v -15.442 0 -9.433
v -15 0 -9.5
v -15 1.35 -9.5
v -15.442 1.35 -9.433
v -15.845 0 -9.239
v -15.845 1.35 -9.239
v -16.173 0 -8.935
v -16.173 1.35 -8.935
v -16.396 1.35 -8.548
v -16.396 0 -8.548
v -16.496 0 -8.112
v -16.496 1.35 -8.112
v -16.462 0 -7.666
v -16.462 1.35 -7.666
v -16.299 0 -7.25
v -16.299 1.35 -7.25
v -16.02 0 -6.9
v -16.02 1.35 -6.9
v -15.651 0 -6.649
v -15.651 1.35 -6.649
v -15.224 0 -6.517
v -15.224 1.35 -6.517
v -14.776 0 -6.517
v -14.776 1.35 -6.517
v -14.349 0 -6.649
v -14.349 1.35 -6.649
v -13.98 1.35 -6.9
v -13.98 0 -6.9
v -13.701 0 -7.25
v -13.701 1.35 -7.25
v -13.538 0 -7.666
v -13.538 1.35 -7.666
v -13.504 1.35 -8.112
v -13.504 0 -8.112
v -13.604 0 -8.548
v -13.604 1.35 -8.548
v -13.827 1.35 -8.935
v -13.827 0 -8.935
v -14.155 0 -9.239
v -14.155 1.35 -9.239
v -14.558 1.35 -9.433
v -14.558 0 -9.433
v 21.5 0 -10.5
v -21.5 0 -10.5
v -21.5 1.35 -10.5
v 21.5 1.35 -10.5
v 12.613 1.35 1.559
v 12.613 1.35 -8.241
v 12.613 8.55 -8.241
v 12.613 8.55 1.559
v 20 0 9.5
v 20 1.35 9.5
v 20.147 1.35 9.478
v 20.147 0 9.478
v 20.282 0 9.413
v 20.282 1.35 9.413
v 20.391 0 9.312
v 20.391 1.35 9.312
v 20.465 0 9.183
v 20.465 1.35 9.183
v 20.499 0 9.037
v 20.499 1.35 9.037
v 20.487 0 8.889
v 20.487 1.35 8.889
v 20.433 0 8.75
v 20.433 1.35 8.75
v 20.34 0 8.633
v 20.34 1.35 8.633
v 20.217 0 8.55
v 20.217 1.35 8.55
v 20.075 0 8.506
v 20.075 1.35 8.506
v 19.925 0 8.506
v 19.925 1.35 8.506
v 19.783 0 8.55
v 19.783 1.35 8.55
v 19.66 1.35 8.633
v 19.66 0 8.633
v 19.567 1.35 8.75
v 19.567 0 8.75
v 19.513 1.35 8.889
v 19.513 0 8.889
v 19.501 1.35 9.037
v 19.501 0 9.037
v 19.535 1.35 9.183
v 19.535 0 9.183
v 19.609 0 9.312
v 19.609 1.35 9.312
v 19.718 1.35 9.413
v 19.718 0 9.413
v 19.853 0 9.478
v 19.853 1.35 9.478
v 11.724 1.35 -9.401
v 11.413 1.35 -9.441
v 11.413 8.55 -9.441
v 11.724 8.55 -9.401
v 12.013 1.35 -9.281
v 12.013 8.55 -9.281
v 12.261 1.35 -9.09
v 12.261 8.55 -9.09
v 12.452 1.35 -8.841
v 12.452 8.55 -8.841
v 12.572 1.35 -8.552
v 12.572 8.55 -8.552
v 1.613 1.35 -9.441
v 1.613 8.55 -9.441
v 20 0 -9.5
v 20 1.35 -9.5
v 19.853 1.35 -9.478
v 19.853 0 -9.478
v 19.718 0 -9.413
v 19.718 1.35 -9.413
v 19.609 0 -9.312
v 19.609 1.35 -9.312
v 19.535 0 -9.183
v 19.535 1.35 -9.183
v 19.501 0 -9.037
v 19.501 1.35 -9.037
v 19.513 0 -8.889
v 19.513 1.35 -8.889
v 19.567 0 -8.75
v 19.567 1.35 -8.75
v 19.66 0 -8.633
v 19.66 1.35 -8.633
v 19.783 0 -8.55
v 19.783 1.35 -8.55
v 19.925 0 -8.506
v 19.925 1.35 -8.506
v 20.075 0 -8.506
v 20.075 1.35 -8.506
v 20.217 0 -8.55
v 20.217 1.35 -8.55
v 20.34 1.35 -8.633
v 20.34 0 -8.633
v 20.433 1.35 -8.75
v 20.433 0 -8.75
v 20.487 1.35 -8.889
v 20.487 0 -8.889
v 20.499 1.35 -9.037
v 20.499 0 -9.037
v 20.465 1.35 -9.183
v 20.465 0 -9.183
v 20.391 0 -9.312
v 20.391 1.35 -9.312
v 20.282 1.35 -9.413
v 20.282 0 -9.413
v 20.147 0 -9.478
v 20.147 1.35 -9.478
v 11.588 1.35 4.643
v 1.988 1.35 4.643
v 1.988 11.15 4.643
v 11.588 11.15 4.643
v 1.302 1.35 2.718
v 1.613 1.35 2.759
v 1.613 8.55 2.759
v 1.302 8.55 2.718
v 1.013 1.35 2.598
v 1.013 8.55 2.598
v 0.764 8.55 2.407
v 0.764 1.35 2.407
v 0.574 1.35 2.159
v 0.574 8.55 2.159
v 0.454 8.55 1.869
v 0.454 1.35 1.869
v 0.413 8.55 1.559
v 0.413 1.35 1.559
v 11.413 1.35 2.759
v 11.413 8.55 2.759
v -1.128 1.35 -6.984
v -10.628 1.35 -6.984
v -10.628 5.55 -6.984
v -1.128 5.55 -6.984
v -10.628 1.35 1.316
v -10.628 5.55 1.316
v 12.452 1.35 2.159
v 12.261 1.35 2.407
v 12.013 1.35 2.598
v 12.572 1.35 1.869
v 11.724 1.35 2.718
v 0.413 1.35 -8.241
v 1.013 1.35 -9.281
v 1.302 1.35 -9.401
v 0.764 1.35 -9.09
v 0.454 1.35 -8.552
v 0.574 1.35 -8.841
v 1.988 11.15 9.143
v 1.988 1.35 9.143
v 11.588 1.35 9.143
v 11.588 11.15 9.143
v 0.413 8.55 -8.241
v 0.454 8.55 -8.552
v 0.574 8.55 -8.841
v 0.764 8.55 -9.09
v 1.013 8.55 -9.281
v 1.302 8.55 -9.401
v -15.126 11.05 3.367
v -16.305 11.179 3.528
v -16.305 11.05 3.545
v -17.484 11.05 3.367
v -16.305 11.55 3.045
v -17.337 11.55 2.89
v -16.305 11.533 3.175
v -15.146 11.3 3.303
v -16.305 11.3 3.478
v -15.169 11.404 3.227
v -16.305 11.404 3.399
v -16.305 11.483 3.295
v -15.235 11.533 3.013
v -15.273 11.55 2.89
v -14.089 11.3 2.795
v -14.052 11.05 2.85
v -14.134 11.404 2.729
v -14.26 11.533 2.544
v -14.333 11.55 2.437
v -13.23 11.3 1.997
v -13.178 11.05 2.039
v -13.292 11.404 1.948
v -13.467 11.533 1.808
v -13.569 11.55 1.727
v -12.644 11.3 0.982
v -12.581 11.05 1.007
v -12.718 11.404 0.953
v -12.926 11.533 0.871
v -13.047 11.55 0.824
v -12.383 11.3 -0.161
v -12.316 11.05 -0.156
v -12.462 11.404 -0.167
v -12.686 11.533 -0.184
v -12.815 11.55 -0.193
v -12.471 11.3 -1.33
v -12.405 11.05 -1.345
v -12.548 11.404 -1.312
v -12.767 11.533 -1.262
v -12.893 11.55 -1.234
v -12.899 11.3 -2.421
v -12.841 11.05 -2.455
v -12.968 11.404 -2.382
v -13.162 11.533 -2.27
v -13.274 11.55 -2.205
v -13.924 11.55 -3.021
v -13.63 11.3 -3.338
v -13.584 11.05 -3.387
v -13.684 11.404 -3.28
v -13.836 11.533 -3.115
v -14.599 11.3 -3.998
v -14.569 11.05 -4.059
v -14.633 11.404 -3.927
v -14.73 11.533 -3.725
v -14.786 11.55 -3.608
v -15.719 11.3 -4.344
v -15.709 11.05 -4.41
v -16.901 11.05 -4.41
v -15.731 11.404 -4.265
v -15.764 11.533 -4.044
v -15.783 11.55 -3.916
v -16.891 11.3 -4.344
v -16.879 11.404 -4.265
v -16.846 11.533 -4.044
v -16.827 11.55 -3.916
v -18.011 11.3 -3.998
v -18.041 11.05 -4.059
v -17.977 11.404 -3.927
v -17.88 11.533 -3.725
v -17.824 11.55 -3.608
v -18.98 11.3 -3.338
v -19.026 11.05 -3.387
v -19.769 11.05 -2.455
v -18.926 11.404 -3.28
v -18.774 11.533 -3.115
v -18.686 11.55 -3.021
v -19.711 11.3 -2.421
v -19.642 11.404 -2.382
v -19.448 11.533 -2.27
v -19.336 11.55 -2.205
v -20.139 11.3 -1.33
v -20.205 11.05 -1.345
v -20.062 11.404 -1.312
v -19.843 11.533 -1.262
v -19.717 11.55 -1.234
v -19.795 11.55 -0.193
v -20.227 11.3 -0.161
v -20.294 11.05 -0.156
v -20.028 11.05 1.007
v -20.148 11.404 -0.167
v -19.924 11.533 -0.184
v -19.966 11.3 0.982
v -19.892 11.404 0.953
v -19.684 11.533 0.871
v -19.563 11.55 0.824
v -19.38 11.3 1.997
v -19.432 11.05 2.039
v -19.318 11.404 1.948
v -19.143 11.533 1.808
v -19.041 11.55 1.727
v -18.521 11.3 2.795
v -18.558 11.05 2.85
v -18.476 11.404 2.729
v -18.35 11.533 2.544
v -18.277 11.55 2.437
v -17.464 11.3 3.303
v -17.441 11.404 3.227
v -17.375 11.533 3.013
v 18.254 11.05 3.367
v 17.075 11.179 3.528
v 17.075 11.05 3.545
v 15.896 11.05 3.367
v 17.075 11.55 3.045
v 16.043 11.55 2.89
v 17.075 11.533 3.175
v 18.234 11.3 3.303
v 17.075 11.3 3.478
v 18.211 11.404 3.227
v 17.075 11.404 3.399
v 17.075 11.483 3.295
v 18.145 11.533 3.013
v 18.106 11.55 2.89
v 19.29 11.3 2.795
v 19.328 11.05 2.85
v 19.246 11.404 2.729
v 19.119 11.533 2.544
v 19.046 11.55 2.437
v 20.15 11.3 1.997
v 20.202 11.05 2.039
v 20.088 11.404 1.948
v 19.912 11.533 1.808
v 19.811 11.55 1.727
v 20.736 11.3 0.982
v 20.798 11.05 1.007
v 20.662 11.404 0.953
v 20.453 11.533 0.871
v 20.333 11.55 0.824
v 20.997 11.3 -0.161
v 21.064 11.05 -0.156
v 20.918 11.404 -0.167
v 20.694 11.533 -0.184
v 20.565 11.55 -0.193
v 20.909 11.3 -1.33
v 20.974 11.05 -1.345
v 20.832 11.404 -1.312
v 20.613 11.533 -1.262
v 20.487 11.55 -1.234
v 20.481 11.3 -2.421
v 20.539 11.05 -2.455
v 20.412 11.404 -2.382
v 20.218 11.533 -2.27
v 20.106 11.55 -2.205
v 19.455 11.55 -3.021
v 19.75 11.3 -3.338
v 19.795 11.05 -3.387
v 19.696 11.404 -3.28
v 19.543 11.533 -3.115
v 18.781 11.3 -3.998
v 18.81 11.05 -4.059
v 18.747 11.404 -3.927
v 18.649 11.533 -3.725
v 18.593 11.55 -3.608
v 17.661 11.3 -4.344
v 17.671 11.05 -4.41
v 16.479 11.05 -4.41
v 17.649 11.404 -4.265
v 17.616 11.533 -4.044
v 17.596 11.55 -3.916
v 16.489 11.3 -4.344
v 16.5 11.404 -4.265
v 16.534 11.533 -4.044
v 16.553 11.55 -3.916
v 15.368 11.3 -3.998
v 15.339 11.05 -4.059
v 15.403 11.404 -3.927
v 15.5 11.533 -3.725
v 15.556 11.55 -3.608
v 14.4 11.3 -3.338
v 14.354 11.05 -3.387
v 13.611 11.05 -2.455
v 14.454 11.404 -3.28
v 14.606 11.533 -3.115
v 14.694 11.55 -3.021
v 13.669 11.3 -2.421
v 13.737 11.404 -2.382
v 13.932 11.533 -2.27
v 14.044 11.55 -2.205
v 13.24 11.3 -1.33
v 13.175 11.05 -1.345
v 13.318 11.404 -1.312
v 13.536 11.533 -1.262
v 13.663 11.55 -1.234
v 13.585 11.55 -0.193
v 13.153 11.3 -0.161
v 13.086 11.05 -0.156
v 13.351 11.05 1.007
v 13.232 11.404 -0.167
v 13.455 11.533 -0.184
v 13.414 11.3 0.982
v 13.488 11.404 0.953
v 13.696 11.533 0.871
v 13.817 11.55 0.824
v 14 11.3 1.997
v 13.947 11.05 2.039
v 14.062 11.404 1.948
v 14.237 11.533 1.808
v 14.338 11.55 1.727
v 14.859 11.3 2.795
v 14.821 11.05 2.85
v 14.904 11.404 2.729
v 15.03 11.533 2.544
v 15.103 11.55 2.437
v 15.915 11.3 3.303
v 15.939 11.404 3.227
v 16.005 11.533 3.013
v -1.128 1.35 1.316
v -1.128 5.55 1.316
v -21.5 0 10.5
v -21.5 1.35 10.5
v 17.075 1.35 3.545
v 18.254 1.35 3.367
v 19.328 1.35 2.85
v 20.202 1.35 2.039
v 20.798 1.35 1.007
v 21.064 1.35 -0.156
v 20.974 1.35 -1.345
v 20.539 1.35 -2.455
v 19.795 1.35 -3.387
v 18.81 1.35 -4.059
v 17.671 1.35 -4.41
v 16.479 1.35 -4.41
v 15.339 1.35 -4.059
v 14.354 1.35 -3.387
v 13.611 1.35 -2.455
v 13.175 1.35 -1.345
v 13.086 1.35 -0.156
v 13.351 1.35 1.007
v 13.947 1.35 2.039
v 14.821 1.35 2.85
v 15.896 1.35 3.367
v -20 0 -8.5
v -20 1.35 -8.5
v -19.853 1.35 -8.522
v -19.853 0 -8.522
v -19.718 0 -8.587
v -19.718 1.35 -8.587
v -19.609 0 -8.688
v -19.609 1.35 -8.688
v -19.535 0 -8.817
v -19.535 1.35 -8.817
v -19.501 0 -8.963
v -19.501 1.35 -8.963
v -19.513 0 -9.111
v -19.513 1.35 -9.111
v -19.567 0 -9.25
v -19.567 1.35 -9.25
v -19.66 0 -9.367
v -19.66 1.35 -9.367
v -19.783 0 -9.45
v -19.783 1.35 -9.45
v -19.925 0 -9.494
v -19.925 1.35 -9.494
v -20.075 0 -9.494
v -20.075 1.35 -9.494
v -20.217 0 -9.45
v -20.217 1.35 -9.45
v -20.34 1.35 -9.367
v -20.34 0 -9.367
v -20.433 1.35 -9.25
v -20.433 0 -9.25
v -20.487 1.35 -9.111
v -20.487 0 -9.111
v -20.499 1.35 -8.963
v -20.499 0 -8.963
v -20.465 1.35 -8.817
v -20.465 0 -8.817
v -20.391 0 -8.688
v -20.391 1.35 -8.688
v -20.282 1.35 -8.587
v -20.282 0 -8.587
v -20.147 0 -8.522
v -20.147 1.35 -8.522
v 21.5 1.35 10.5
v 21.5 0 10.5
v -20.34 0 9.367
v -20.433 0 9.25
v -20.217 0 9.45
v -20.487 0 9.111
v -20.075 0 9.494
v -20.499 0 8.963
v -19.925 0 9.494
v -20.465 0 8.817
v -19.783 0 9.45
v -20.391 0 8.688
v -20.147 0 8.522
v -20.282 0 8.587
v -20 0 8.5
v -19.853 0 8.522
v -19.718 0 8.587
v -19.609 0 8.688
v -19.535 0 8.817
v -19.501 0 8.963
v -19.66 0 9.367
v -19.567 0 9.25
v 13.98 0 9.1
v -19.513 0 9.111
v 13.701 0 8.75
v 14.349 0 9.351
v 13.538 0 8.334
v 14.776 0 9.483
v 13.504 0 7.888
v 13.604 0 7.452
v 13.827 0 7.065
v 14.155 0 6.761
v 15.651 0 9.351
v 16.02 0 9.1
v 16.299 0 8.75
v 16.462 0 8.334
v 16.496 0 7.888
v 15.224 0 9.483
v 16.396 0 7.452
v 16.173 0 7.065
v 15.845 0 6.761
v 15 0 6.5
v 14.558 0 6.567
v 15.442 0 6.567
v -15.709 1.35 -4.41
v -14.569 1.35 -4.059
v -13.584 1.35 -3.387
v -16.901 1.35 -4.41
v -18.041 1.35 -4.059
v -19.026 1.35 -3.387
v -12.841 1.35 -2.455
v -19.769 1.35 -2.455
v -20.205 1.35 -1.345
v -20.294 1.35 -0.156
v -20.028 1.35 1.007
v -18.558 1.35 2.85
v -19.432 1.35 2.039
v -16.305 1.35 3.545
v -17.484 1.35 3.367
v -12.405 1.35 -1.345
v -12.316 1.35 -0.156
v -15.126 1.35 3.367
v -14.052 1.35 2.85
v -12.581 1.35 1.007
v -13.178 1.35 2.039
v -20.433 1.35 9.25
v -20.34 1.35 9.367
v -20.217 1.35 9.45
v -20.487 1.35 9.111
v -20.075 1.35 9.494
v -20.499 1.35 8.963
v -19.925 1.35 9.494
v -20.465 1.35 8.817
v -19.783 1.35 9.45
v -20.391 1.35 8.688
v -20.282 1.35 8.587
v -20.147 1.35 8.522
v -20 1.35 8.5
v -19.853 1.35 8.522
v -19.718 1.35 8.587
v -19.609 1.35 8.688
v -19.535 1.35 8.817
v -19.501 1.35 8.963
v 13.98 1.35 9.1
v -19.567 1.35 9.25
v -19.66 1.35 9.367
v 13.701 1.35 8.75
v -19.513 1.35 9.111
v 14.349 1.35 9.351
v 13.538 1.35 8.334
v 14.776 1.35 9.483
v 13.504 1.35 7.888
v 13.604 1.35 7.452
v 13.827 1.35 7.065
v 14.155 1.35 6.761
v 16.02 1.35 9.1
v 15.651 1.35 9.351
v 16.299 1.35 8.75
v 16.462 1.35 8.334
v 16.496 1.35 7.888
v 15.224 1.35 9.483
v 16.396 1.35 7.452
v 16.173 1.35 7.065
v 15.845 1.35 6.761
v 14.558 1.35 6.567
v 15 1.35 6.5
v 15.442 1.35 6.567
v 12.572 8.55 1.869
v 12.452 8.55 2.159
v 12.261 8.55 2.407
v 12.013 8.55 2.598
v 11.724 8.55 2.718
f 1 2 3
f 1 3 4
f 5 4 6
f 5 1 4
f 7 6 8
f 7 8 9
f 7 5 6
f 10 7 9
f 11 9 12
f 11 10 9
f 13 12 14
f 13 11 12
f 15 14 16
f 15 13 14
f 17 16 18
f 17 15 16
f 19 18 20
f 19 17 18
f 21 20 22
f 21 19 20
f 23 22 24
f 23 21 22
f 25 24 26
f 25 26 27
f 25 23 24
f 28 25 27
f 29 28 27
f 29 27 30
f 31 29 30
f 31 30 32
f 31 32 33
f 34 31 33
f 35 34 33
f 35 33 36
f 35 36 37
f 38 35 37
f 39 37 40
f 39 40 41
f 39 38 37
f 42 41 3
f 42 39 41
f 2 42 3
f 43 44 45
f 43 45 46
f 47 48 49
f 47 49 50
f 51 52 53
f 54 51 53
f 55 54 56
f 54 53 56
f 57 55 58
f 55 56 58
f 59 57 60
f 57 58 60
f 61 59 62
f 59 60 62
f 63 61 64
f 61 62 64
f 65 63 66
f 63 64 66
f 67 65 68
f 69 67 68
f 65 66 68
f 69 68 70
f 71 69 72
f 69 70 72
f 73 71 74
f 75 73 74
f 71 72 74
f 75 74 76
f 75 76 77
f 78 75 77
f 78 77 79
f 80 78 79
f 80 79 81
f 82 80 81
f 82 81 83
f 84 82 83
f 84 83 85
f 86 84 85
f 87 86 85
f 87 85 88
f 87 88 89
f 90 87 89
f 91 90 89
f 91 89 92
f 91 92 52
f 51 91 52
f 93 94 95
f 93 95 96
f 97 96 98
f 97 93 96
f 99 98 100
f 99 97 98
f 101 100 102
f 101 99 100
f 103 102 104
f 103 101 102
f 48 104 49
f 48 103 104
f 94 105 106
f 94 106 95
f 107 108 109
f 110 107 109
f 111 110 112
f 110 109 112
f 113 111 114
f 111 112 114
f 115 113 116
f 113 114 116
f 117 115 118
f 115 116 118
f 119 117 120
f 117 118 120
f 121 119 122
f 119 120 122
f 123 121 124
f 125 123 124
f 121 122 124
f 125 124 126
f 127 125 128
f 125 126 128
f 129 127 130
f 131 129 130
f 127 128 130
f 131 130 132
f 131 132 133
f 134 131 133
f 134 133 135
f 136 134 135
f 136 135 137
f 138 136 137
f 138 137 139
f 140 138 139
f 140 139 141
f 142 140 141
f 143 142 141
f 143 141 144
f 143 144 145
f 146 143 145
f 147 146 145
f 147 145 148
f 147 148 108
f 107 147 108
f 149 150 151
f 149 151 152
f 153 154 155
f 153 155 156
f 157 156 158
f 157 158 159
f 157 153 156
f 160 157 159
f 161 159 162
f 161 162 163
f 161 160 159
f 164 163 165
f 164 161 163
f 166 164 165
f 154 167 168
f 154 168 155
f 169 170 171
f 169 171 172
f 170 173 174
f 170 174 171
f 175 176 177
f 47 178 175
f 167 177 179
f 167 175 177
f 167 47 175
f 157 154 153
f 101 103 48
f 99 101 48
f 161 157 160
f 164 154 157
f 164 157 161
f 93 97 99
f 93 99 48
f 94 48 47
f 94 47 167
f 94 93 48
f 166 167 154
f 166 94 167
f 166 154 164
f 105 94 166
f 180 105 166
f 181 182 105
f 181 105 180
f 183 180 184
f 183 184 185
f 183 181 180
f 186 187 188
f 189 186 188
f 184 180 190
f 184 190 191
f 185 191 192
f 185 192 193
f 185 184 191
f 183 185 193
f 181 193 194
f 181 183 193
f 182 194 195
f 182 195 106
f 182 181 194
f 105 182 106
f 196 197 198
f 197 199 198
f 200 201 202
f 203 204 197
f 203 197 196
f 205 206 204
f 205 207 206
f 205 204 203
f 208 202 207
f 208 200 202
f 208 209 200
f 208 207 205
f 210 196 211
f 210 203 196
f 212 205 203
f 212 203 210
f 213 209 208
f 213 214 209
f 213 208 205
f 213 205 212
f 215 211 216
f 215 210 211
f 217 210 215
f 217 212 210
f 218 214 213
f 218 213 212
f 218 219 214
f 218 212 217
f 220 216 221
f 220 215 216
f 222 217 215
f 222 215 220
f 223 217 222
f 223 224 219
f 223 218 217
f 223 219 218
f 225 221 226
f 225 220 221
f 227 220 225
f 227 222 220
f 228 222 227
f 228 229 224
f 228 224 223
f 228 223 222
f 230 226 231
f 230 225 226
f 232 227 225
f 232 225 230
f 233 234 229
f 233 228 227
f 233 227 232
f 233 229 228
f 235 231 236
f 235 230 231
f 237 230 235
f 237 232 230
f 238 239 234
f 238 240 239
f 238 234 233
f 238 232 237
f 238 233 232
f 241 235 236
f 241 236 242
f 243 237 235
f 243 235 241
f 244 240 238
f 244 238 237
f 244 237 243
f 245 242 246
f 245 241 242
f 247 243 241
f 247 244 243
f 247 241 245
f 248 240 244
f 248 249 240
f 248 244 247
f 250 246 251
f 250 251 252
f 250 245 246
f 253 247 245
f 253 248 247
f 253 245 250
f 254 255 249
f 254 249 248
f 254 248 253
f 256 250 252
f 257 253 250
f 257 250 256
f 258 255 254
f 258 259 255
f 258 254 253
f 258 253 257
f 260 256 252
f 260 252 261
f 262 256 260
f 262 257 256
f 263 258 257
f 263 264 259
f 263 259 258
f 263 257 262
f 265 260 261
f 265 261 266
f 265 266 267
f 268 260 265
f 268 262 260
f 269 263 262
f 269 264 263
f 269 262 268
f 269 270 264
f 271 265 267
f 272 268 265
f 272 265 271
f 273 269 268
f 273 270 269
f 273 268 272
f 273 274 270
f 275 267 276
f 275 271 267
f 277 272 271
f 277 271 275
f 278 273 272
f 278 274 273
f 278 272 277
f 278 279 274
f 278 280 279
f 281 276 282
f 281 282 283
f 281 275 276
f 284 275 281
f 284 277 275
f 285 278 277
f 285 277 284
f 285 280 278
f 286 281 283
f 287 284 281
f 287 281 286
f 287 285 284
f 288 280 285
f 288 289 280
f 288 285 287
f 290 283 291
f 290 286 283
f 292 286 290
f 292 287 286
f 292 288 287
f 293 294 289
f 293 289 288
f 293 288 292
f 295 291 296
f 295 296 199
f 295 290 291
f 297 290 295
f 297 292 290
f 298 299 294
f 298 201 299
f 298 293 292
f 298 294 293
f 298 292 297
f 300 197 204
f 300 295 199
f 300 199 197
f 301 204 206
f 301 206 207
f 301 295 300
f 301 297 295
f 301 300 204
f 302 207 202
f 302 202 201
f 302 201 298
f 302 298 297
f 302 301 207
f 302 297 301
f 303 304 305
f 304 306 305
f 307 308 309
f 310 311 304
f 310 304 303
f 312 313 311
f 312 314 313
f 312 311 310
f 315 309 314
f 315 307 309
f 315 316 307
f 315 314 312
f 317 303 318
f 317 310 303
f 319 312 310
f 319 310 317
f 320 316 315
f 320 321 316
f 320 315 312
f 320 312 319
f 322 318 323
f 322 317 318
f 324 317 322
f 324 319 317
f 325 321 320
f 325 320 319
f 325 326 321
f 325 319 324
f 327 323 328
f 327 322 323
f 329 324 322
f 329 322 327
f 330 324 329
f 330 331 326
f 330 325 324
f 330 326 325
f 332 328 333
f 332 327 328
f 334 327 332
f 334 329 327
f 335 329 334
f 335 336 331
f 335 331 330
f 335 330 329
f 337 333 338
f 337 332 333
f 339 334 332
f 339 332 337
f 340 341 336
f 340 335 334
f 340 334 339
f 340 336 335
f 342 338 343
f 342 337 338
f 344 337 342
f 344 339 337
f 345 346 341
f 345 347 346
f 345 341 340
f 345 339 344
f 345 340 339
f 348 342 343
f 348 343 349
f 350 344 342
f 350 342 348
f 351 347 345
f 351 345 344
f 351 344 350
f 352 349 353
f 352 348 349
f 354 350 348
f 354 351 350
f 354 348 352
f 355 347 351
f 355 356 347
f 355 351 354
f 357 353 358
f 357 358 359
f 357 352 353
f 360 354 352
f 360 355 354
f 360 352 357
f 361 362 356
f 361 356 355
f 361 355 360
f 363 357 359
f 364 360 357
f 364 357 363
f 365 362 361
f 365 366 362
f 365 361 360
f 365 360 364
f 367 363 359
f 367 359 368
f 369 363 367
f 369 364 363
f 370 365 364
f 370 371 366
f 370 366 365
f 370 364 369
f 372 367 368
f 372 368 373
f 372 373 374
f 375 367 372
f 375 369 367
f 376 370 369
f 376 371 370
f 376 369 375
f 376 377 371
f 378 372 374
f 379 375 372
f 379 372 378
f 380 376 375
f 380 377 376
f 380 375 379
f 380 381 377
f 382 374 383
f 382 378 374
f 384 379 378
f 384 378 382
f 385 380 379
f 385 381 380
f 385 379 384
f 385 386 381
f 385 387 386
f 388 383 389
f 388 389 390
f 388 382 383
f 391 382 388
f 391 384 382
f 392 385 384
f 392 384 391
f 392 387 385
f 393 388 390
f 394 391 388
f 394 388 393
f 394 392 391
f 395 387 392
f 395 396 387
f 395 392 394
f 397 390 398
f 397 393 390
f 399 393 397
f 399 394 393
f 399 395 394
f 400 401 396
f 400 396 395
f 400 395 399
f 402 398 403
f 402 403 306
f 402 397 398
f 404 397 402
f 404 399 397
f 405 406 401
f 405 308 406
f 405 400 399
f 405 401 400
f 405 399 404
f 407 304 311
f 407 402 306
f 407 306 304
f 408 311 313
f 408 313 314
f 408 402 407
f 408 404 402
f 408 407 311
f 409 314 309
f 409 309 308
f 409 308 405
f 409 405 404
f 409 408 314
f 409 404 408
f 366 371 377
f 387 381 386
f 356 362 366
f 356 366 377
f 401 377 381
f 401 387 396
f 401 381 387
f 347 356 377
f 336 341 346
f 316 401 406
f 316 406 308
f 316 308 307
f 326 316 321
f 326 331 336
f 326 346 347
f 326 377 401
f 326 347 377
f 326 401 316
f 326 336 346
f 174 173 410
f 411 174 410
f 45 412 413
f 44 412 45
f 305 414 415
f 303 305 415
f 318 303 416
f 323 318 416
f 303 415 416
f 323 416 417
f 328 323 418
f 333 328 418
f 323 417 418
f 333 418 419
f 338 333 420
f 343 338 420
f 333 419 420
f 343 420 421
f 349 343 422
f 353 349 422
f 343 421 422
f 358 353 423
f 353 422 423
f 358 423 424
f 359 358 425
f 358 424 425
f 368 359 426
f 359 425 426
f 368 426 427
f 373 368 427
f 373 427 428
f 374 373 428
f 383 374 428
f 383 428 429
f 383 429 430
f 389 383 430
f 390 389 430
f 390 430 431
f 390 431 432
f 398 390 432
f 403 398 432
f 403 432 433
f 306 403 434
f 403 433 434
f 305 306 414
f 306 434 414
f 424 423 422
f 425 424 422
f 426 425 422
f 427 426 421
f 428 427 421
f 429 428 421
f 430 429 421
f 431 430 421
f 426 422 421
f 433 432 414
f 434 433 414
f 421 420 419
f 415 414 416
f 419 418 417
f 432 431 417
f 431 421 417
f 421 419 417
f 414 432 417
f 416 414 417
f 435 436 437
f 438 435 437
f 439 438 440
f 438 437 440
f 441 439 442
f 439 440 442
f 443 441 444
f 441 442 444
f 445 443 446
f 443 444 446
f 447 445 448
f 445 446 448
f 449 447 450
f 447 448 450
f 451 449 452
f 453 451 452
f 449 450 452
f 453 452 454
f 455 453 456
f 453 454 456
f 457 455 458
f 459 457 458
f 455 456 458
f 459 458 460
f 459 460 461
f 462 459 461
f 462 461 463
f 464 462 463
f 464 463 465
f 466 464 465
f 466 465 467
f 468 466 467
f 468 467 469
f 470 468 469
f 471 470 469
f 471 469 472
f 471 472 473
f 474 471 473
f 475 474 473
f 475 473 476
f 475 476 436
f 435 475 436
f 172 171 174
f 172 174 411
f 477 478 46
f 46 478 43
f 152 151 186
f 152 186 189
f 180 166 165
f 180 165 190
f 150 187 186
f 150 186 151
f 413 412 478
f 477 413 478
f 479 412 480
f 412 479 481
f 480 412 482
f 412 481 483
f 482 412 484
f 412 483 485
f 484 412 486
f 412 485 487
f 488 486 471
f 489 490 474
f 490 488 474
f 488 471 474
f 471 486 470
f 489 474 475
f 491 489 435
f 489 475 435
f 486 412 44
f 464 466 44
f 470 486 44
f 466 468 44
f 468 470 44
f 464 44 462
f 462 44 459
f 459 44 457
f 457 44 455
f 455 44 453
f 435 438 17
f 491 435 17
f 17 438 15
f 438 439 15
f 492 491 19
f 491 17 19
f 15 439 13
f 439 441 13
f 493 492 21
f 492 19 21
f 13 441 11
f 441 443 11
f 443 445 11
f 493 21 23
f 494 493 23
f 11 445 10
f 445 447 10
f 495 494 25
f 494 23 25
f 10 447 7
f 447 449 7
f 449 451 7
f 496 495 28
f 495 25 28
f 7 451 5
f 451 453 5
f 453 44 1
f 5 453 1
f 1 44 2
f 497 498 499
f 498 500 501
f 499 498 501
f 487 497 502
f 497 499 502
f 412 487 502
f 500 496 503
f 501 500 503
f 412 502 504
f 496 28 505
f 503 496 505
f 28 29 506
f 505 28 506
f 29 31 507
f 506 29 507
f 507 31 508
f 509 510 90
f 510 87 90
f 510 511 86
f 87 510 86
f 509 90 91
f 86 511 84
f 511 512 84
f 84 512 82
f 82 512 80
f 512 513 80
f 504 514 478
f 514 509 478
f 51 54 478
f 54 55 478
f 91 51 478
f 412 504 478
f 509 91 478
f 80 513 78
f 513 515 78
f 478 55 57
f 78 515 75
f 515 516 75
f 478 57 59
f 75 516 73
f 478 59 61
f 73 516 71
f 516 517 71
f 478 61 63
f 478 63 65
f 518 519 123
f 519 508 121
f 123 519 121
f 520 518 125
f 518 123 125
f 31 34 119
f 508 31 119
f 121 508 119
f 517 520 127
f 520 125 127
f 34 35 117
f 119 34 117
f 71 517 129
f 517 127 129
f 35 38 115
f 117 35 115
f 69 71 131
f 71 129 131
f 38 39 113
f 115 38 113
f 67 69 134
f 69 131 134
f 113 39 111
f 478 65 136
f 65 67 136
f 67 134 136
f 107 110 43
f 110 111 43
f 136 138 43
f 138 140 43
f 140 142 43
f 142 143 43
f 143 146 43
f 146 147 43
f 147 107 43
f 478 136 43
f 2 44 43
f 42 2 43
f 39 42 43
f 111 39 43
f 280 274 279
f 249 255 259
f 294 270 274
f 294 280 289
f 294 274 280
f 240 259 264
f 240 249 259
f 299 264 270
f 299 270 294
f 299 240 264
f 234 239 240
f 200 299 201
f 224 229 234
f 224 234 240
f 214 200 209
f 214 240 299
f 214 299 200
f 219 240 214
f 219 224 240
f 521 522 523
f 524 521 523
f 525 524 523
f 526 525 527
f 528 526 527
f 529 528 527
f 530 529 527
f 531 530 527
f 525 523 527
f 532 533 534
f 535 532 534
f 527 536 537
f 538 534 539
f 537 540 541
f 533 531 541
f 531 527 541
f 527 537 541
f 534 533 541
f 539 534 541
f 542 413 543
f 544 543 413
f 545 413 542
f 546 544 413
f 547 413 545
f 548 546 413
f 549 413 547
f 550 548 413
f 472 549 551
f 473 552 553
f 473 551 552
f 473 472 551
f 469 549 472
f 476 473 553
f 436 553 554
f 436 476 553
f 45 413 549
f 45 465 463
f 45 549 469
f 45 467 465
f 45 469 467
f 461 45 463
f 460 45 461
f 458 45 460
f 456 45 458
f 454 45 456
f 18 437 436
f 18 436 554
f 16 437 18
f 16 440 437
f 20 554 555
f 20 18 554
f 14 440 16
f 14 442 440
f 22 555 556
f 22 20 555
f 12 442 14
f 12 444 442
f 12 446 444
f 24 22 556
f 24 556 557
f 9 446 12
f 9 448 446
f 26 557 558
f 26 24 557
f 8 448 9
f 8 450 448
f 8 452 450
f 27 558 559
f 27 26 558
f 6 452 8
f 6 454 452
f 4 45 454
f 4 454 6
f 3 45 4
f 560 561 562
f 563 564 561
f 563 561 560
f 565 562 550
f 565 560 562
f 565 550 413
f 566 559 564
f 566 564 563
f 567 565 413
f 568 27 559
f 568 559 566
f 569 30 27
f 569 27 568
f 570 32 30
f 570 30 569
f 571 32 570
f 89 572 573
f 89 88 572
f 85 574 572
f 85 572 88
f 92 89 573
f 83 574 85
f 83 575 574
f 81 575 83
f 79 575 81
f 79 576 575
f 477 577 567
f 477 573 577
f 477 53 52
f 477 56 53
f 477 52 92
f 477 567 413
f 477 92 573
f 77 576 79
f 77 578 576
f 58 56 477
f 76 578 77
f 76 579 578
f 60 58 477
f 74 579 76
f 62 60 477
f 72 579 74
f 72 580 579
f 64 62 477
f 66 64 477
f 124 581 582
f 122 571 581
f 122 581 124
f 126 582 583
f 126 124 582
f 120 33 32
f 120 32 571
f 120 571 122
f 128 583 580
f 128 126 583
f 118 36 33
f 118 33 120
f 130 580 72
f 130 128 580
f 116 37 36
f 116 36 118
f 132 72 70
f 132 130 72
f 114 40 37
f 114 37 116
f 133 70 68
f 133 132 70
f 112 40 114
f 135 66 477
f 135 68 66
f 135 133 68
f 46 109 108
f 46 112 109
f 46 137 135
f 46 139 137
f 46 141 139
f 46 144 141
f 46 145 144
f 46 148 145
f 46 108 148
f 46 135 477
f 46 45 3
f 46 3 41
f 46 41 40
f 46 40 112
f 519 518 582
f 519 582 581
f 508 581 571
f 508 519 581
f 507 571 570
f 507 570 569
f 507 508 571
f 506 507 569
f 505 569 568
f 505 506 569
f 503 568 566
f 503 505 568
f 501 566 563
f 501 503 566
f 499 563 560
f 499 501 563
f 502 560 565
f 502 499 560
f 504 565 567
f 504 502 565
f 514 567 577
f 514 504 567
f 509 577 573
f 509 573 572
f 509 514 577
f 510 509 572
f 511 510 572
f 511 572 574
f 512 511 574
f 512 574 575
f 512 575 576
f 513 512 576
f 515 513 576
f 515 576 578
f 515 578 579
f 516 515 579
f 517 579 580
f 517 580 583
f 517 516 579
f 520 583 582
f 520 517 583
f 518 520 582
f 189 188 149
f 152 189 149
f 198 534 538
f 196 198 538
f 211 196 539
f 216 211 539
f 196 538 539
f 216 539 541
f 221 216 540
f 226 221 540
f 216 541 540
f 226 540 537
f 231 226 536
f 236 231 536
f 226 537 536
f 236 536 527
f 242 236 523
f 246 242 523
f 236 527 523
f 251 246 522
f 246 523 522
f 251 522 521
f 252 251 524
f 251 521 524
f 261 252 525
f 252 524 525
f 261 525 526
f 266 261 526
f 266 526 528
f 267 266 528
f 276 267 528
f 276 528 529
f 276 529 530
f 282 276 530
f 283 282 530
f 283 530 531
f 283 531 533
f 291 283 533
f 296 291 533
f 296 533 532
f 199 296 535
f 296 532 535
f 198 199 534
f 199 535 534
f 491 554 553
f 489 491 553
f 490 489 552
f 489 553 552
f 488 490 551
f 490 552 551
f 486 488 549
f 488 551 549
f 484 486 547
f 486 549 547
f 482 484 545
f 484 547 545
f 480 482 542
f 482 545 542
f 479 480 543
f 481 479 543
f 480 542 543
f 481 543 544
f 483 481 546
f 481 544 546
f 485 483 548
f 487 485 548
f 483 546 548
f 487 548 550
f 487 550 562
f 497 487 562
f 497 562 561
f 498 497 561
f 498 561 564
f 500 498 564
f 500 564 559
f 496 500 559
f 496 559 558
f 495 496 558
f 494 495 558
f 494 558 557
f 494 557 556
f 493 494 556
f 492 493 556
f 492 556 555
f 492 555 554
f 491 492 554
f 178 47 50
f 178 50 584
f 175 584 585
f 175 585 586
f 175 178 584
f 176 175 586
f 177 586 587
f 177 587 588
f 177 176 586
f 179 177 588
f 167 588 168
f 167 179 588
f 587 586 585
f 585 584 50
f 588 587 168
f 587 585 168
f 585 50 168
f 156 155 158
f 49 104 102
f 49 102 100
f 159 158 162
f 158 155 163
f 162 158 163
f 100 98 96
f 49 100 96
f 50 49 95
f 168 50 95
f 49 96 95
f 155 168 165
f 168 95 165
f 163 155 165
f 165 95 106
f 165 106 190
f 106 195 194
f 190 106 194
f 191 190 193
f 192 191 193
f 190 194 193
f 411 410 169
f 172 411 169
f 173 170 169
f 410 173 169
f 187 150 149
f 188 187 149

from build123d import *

# Parameters (mm, degrees)
SKETCH2_W             = 43
SKETCH2_H             = 21
SKETCH2_R             = 1.5
BOSS_EXTRUDE1_DEPTH   = 1.35
SKETCH3_R             = 0.5
CUT_EXTRUDE1_DEPTH    = 24.965026601
BOSS_EXTRUDE2_DEPTH   = 7.2
SKETCH6_W             = 9.6
SKETCH6_H             = 4.5
BOSS_EXTRUDE3_DEPTH   = 9.8
SKETCH7_W             = 9.5
SKETCH7_H             = 8.3
BOSS_EXTRUDE4_DEPTH   = 4.2
SKETCH8_R             = 4
BOSS_EXTRUDE5_DEPTH   = 10.2
BOSS_EXTRUDE5_2_DEPTH = 10.2
FILLET1_R             = 0.5
FILLET2_R             = 0.5


with BuildPart() as part:
    # Sketch2 → Boss-Extrude1 (new body)
    with BuildSketch(Plane(origin=(0, 0, 0), x_dir=(1, 0, 0), z_dir=(0, 1, 0))):
        Rectangle(SKETCH2_W, SKETCH2_H)
        with Locations(Location((-15, 8, 0), (0, 0, 90))):
            Circle(SKETCH2_R, mode=Mode.SUBTRACT)
        with Locations(Location((15, -8, 0), (0, 0, 90))):
            Circle(SKETCH2_R, mode=Mode.SUBTRACT)
    extrude(amount=BOSS_EXTRUDE1_DEPTH)

    # Sketch3 → Cut-Extrude1 (cut, through all)
    with BuildSketch(Plane(origin=(0, 1.35, 0), x_dir=(1, 0, 0), z_dir=(0, 1, 0))):
        with Locations(Location((-20, 9, 0), (0, 0, 270))):
            Circle(SKETCH3_R)
        with Locations(Location((20, 9, 0), (0, 0, 90))):
            Circle(SKETCH3_R)
        with Locations(Location((-20, -9, 0), (0, 0, 90))):
            Circle(SKETCH3_R)
        with Locations(Location((20, -9, 0), (0, 0, 270))):
            Circle(SKETCH3_R)
    extrude(amount=-CUT_EXTRUDE1_DEPTH, mode=Mode.SUBTRACT)


with BuildPart() as body_2:
    # Sketch4 → Boss-Extrude2 (new body)
    with BuildSketch(Plane(origin=(0, 1.35, 0), x_dir=(1, 0, 0), z_dir=(0, 1, 0))):
        with BuildLine():
            Line((1.612940952, 9.441476518), (11.412940952, 9.441476518))
            ThreePointArc((11.412940952, 9.441476518), (12.261469089, 9.090004656), (12.612940952, 8.241476518))
            Line((12.612940952, 8.241476518), (12.612940952, -1.558523482))
            ThreePointArc((12.612940952, -1.558523482), (12.261469089, -2.407051619), (11.412940952, -2.758523482))
            Line((11.412940952, -2.758523482), (1.612940952, -2.758523482))
            ThreePointArc((1.612940952, -2.758523482), (0.764412814, -2.407051619), (0.412940952, -1.558523482))
            Line((0.412940952, -1.558523482), (0.412940952, 8.241476518))
            ThreePointArc((0.412940952, 8.241476518), (0.764412814, 9.090004656), (1.612940952, 9.441476518))
        make_face()
    extrude(amount=BOSS_EXTRUDE2_DEPTH)


with BuildPart() as body_3:
    # Sketch6 → Boss-Extrude3 (new body)
    with BuildSketch(Plane(origin=(0, 1.35, 0), x_dir=(1, 0, 0), z_dir=(0, 1, 0))):
        with Locations((6.787914585, -6.892882336)):
            Rectangle(SKETCH6_W, SKETCH6_H)
    extrude(amount=BOSS_EXTRUDE3_DEPTH)


with BuildPart() as body_4:
    # Sketch7 → Boss-Extrude4 (new body)
    with BuildSketch(Plane(origin=(0, 1.35, 0), x_dir=(1, 0, 0), z_dir=(0, 1, 0))):
        with Locations((-5.878194074, 2.834129285)):
            Rectangle(SKETCH7_W, SKETCH7_H)
    extrude(amount=BOSS_EXTRUDE4_DEPTH)


with BuildPart() as body_5:
    # Sketch8 → Boss-Extrude5 (new body)
    with BuildSketch(Plane(origin=(0, 1.35, 0), x_dir=(1, 0, 0), z_dir=(0, 1, 0))):
        with Locations(Location((-16.304990704, 0.454860256, 0), (0, 0, 270))):
            Circle(SKETCH8_R)
    extrude(amount=BOSS_EXTRUDE5_DEPTH)

    # Fillet1
    fillet1_edges = [body_5.edges().sort_by_distance(p)[0] for p in [
        (-16.304990704, 11.55, -4.454860256),
    ]]
    fillet(fillet1_edges, radius=FILLET1_R)


with BuildPart() as body_6:
    # Sketch8 → Boss-Extrude5 2 (new body)
    with BuildSketch(Plane(origin=(0, 1.35, 0), x_dir=(1, 0, 0), z_dir=(0, 1, 0))):
        with Locations(Location((17.074754214, 0.454860256, 0), (0, 0, 270))):
            Circle(SKETCH8_R)
    extrude(amount=BOSS_EXTRUDE5_2_DEPTH)

    # Fillet2
    fillet2_edges = [body_6.edges().sort_by_distance(p)[0] for p in [
        (17.074754214, 11.55, -4.454860256),
    ]]
    fillet(fillet2_edges, radius=FILLET2_R)


solid = Compound([part.part, body_2.part, body_3.part, body_4.part, body_5.part, body_6.part])
